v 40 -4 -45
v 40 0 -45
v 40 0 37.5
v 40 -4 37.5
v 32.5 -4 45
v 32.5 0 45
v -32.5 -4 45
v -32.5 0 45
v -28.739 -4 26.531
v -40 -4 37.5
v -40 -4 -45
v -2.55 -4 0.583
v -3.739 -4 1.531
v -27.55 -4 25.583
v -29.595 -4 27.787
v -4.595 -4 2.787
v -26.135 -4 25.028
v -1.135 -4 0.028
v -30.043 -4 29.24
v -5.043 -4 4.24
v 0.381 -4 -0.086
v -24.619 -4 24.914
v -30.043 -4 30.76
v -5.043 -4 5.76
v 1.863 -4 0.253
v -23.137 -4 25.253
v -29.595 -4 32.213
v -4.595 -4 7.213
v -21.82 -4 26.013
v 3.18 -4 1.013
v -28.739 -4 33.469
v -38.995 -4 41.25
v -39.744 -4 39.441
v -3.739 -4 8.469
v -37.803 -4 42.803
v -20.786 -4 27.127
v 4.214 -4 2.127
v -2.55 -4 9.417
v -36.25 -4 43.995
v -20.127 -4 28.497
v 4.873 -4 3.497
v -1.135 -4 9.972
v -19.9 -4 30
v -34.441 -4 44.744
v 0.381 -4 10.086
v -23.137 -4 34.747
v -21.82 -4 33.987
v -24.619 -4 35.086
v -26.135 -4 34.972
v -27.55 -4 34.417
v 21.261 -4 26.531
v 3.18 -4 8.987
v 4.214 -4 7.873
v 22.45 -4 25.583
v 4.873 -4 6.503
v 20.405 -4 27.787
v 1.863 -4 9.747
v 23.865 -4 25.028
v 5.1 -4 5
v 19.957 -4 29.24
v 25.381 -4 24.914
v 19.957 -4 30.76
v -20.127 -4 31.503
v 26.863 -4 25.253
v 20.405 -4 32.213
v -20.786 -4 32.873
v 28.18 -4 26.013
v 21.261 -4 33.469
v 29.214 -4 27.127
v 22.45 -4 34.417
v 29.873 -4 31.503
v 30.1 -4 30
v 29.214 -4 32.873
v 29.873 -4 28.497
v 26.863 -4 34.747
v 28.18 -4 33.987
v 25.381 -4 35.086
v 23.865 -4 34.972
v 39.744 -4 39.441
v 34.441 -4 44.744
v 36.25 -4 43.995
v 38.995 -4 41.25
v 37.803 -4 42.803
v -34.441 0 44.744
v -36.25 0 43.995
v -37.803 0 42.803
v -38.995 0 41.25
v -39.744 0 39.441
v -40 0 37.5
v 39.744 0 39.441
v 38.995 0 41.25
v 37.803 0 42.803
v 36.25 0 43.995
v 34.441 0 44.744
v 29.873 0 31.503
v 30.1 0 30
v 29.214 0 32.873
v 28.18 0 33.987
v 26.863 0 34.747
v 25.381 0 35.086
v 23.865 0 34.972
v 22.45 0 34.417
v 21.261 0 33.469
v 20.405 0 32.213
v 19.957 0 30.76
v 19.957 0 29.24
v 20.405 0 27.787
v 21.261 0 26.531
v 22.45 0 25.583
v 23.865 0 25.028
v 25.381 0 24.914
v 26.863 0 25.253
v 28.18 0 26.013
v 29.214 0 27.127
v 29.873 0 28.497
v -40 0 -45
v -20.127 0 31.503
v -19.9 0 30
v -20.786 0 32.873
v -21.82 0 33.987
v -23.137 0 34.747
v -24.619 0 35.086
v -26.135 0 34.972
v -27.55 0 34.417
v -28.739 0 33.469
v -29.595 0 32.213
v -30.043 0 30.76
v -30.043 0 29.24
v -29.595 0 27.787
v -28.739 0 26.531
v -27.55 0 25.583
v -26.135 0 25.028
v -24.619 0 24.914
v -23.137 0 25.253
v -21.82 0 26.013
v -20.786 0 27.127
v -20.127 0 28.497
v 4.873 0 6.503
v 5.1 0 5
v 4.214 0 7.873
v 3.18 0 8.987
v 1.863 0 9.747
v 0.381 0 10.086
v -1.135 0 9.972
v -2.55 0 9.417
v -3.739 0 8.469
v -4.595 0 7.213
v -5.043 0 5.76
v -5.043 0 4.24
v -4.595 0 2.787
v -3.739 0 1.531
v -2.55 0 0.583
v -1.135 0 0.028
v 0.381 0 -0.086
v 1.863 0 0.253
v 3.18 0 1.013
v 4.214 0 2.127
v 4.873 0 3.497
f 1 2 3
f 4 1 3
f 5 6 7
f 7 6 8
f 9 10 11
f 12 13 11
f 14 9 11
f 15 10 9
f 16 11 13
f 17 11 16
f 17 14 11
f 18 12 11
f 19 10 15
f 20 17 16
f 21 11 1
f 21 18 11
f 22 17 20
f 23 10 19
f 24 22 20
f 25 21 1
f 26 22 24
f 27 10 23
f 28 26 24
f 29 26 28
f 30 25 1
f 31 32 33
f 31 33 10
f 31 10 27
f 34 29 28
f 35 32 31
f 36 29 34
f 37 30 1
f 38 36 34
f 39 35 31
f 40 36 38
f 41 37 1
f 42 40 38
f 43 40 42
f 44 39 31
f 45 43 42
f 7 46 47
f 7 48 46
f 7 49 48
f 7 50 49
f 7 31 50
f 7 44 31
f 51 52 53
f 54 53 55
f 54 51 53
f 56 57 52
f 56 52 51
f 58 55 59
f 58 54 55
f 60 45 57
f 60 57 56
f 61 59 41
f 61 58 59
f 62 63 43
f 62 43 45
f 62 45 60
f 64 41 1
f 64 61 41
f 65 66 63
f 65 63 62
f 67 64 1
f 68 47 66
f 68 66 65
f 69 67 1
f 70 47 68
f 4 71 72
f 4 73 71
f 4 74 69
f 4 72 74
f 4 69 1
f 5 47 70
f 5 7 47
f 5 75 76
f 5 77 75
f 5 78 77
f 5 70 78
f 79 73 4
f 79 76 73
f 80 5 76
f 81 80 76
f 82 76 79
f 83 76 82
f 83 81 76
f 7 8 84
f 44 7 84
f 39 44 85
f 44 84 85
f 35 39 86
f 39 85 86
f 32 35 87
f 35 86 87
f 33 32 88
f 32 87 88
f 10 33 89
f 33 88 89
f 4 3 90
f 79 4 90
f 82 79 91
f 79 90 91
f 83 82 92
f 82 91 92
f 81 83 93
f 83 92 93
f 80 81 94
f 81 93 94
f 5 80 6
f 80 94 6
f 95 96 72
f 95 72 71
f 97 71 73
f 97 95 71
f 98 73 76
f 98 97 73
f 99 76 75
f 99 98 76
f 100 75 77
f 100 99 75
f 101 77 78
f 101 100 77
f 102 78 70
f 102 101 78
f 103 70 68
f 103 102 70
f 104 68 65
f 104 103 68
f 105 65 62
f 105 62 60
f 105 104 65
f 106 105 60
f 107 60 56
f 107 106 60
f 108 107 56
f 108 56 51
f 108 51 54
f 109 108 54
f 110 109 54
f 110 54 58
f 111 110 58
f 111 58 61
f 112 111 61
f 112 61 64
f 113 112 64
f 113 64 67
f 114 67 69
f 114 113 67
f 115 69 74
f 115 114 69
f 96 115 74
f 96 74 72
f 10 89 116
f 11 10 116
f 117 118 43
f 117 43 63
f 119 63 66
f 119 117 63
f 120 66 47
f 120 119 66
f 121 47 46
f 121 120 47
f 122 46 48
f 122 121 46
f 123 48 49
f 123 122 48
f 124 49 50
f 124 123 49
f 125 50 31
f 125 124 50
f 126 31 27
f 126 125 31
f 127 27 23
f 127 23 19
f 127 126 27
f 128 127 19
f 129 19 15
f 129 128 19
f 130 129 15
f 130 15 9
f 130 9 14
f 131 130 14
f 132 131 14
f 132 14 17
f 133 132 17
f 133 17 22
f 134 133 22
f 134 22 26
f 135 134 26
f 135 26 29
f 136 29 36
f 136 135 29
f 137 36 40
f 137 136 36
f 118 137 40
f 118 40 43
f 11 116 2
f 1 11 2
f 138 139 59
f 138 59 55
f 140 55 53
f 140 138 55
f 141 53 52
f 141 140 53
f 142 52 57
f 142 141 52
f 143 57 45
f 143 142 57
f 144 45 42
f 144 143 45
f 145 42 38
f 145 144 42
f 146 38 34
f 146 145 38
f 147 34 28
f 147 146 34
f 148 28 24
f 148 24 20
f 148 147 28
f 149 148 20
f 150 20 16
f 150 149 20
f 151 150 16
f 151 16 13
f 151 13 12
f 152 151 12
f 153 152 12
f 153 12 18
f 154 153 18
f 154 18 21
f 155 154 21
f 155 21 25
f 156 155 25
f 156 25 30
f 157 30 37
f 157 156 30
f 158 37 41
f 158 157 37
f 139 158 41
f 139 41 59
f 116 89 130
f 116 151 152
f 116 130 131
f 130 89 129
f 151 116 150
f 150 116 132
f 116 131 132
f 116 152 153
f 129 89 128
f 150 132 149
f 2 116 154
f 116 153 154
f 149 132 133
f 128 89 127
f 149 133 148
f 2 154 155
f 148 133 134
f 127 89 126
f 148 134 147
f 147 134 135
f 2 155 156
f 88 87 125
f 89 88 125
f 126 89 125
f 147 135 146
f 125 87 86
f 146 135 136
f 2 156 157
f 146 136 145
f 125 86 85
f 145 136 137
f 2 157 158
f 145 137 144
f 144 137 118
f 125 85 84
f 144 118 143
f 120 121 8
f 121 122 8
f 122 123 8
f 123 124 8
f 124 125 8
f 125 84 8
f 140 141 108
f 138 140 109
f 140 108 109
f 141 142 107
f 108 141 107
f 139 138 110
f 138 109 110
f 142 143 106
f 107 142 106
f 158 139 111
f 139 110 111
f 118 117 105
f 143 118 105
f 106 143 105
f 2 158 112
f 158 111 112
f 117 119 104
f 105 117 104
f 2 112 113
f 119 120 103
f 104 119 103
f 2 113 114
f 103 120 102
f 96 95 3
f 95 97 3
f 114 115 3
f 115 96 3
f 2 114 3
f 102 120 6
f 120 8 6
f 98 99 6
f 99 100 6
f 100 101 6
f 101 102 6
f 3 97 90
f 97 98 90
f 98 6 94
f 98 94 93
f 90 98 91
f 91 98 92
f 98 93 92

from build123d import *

# Parameters (mm, degrees)
F0_R     = 5.1
F1_DEPTH = 4


with BuildPart() as f1:
    # F0 (on Front) → F1 (new body)
    with BuildSketch(Plane.XZ):
        with BuildLine():
            ThreePointArc((40, 37.5), (37.803301, 42.803301), (32.5, 45))
            Line((32.5, 45), (-32.5, 45))
            ThreePointArc((-32.5, 45), (-37.803301, 42.803301), (-40, 37.5))
            Line((-40, 37.5), (-40, -45))
            Line((-40, -45), (40, -45))
            Line((40, -45), (40, 37.5))
        make_face()
        with Locations((-25, 30)):
            Circle(F0_R, mode=Mode.SUBTRACT)
        with Locations((0, 5)):
            Circle(F0_R, mode=Mode.SUBTRACT)
        with Locations((25, 30)):
            Circle(F0_R, mode=Mode.SUBTRACT)
    extrude(amount=F1_DEPTH)


solid = f1.part
